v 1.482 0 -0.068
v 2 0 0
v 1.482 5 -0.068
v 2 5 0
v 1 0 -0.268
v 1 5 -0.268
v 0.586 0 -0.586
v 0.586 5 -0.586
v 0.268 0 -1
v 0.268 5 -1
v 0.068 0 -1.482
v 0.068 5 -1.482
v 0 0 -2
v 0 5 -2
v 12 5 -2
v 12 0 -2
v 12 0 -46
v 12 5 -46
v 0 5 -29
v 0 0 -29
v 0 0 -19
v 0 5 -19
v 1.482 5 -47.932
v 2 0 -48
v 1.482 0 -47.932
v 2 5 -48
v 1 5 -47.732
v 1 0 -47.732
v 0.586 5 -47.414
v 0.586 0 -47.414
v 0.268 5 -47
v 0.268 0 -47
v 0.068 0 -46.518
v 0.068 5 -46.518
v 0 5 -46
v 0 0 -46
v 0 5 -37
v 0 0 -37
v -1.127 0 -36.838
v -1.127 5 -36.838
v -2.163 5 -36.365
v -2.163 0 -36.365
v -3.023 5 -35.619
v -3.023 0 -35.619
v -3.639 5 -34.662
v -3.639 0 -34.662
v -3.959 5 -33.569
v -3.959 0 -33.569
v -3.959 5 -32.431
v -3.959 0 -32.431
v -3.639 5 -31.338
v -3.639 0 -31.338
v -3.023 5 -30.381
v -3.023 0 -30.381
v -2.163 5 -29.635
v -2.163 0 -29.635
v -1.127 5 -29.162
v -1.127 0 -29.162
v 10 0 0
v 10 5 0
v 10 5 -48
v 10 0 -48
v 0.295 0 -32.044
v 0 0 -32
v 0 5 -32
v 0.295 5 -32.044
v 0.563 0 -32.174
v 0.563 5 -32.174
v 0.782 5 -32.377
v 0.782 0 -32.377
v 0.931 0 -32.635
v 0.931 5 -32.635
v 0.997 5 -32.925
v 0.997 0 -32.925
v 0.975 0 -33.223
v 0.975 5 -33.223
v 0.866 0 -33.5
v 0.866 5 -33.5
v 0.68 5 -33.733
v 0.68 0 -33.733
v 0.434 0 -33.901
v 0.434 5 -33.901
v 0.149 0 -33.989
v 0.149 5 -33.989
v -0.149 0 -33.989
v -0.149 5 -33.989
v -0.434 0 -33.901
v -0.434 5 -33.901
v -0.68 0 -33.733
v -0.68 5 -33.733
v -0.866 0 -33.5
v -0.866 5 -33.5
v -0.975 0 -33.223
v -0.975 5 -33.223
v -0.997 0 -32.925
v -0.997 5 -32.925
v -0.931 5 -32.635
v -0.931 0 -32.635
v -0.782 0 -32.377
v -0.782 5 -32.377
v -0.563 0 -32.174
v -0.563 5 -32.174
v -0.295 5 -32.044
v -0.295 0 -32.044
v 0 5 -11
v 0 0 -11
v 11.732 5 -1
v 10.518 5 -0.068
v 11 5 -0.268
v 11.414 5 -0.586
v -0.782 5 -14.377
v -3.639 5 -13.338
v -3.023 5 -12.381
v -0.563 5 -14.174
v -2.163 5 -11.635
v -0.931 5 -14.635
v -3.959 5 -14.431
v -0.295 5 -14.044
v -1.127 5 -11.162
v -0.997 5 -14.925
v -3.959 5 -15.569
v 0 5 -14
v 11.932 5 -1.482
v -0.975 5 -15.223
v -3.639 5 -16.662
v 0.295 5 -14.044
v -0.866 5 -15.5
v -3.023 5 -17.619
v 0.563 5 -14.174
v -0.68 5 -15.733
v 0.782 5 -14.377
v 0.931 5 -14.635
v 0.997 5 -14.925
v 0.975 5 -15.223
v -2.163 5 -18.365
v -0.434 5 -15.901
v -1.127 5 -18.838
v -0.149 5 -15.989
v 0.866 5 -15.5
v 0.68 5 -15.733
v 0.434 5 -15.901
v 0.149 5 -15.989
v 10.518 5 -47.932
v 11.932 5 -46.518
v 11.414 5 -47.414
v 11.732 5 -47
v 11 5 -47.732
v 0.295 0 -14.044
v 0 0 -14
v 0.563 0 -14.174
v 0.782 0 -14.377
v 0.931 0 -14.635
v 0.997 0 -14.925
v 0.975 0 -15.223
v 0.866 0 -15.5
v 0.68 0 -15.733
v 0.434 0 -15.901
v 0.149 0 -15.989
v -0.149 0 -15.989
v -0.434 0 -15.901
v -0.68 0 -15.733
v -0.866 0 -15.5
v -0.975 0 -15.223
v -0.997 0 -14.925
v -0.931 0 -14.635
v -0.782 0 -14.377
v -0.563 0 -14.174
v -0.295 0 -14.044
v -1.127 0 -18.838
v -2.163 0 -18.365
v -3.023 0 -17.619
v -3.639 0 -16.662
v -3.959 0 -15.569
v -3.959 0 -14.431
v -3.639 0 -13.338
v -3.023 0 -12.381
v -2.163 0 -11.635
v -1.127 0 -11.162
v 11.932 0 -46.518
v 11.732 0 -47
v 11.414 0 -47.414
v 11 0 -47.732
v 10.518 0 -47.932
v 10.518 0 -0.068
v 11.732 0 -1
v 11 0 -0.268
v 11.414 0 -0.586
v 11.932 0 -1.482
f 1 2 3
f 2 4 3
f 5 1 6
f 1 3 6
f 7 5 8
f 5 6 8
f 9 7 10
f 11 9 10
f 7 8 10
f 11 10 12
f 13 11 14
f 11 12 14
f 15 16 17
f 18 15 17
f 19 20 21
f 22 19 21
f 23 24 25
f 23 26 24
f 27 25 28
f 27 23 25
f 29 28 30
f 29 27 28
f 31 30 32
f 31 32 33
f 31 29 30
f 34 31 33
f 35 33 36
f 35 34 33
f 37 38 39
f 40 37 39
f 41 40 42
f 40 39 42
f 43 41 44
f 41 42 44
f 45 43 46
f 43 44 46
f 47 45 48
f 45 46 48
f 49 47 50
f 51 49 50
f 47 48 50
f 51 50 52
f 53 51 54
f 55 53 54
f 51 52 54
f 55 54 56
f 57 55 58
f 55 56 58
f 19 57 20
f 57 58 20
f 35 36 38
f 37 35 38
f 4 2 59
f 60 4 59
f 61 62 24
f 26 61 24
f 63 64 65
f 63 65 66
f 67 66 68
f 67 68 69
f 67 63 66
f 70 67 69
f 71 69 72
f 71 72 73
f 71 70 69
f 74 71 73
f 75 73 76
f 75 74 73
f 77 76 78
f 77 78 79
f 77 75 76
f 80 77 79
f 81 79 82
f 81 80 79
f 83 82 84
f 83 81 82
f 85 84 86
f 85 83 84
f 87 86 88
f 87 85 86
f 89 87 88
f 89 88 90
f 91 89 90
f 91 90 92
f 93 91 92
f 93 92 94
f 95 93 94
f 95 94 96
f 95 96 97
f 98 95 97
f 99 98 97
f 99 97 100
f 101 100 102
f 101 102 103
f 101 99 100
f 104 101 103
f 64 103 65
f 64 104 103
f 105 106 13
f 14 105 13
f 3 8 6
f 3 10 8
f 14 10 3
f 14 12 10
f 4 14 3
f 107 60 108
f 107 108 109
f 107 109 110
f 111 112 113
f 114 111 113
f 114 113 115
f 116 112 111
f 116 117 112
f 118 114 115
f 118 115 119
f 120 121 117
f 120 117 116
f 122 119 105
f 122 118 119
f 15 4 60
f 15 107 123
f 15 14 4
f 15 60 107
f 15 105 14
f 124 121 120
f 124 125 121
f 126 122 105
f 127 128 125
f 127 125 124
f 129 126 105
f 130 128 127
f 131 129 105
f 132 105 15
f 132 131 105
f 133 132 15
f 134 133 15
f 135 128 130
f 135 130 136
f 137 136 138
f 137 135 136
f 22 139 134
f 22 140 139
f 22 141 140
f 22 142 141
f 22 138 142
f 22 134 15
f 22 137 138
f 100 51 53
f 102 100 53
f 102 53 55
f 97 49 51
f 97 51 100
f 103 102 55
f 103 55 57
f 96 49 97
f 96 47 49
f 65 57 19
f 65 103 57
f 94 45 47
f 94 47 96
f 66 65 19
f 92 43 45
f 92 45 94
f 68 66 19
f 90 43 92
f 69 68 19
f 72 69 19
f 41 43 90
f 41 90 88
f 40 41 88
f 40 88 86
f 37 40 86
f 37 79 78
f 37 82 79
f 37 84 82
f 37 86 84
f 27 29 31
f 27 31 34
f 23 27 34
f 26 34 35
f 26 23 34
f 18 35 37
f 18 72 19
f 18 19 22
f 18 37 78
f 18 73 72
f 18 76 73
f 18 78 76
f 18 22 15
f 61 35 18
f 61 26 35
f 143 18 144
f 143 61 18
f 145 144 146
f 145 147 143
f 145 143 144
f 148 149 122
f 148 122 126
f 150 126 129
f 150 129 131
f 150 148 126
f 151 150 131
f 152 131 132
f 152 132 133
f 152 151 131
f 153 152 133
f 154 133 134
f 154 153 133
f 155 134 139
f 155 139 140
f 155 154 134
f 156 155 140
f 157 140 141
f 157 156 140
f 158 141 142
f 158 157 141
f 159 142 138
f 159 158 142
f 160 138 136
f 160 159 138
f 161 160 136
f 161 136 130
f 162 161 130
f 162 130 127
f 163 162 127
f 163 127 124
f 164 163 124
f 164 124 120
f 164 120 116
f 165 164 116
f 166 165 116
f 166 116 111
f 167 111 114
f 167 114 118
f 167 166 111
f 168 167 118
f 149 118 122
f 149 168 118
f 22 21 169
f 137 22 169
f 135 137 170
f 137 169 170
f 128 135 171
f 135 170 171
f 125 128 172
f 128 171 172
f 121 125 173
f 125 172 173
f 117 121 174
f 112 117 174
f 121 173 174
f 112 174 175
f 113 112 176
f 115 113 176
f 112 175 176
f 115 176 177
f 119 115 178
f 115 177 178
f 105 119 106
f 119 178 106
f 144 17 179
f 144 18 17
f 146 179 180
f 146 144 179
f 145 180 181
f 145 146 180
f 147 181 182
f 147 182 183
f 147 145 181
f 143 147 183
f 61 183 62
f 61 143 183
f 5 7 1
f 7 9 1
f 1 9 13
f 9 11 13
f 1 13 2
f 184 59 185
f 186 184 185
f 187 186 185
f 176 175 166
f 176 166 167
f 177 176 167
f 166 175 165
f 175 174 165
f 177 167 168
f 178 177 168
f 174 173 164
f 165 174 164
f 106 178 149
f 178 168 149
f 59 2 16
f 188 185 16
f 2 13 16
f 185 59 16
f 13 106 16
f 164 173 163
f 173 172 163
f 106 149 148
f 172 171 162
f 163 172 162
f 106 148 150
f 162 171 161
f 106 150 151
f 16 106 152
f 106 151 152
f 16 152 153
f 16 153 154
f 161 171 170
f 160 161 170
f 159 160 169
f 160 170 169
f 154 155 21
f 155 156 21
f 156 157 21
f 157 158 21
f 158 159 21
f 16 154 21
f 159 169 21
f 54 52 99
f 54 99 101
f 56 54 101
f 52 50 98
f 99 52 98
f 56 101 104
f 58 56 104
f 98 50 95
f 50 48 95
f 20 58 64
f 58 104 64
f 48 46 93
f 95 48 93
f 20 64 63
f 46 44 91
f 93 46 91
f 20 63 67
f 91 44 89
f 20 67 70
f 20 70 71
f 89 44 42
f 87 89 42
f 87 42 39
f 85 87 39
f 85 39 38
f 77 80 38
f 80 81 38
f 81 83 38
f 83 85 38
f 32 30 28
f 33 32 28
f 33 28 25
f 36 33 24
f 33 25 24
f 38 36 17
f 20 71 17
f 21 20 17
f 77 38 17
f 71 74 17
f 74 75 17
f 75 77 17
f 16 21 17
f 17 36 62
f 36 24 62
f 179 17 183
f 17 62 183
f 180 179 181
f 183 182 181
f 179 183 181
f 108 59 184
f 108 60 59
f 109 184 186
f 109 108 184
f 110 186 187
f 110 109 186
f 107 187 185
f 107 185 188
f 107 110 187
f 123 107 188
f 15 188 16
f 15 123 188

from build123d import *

# Parameters (mm, degrees)
SKETCH1_R           = 1
BOSS_EXTRUDE1_DEPTH = 5
FILLET2_R           = 2


with BuildPart() as part:
    # Sketch1 → Boss-Extrude1 (new body)
    with BuildSketch(Plane(origin=(0, 0, 0), x_dir=(1, 0, 0), z_dir=(0, 1, 0))):
        with BuildLine():
            Line((0, 0), (12, 0))
            Line((12, 0), (12, 48))
            Line((12, 48), (0, 48))
            Line((0, 48), (0, 37))
            ThreePointArc((0, 37), (-4, 33), (0, 29))
            Line((0, 29), (0, 19))
            ThreePointArc((0, 19), (-4, 15), (0, 11))
            Line((0, 11), (0, 0))
        make_face()
        with Locations(Location((0, 33, 0), (0, 0, 270))):
            Circle(SKETCH1_R, mode=Mode.SUBTRACT)
        with Locations(Location((0, 15, 0), (0, 0, 270))):
            Circle(SKETCH1_R, mode=Mode.SUBTRACT)
    extrude(amount=BOSS_EXTRUDE1_DEPTH)

    # Fillet2
    fillet2_edges = [part.edges().sort_by_distance(p)[0] for p in [
        (12, 2.5, 0),
        (0, 2.5, 0),
        (0, 2.5, -48),
        (12, 2.5, -48),
    ]]
    fillet(fillet2_edges, radius=FILLET2_R)


solid = part.part
